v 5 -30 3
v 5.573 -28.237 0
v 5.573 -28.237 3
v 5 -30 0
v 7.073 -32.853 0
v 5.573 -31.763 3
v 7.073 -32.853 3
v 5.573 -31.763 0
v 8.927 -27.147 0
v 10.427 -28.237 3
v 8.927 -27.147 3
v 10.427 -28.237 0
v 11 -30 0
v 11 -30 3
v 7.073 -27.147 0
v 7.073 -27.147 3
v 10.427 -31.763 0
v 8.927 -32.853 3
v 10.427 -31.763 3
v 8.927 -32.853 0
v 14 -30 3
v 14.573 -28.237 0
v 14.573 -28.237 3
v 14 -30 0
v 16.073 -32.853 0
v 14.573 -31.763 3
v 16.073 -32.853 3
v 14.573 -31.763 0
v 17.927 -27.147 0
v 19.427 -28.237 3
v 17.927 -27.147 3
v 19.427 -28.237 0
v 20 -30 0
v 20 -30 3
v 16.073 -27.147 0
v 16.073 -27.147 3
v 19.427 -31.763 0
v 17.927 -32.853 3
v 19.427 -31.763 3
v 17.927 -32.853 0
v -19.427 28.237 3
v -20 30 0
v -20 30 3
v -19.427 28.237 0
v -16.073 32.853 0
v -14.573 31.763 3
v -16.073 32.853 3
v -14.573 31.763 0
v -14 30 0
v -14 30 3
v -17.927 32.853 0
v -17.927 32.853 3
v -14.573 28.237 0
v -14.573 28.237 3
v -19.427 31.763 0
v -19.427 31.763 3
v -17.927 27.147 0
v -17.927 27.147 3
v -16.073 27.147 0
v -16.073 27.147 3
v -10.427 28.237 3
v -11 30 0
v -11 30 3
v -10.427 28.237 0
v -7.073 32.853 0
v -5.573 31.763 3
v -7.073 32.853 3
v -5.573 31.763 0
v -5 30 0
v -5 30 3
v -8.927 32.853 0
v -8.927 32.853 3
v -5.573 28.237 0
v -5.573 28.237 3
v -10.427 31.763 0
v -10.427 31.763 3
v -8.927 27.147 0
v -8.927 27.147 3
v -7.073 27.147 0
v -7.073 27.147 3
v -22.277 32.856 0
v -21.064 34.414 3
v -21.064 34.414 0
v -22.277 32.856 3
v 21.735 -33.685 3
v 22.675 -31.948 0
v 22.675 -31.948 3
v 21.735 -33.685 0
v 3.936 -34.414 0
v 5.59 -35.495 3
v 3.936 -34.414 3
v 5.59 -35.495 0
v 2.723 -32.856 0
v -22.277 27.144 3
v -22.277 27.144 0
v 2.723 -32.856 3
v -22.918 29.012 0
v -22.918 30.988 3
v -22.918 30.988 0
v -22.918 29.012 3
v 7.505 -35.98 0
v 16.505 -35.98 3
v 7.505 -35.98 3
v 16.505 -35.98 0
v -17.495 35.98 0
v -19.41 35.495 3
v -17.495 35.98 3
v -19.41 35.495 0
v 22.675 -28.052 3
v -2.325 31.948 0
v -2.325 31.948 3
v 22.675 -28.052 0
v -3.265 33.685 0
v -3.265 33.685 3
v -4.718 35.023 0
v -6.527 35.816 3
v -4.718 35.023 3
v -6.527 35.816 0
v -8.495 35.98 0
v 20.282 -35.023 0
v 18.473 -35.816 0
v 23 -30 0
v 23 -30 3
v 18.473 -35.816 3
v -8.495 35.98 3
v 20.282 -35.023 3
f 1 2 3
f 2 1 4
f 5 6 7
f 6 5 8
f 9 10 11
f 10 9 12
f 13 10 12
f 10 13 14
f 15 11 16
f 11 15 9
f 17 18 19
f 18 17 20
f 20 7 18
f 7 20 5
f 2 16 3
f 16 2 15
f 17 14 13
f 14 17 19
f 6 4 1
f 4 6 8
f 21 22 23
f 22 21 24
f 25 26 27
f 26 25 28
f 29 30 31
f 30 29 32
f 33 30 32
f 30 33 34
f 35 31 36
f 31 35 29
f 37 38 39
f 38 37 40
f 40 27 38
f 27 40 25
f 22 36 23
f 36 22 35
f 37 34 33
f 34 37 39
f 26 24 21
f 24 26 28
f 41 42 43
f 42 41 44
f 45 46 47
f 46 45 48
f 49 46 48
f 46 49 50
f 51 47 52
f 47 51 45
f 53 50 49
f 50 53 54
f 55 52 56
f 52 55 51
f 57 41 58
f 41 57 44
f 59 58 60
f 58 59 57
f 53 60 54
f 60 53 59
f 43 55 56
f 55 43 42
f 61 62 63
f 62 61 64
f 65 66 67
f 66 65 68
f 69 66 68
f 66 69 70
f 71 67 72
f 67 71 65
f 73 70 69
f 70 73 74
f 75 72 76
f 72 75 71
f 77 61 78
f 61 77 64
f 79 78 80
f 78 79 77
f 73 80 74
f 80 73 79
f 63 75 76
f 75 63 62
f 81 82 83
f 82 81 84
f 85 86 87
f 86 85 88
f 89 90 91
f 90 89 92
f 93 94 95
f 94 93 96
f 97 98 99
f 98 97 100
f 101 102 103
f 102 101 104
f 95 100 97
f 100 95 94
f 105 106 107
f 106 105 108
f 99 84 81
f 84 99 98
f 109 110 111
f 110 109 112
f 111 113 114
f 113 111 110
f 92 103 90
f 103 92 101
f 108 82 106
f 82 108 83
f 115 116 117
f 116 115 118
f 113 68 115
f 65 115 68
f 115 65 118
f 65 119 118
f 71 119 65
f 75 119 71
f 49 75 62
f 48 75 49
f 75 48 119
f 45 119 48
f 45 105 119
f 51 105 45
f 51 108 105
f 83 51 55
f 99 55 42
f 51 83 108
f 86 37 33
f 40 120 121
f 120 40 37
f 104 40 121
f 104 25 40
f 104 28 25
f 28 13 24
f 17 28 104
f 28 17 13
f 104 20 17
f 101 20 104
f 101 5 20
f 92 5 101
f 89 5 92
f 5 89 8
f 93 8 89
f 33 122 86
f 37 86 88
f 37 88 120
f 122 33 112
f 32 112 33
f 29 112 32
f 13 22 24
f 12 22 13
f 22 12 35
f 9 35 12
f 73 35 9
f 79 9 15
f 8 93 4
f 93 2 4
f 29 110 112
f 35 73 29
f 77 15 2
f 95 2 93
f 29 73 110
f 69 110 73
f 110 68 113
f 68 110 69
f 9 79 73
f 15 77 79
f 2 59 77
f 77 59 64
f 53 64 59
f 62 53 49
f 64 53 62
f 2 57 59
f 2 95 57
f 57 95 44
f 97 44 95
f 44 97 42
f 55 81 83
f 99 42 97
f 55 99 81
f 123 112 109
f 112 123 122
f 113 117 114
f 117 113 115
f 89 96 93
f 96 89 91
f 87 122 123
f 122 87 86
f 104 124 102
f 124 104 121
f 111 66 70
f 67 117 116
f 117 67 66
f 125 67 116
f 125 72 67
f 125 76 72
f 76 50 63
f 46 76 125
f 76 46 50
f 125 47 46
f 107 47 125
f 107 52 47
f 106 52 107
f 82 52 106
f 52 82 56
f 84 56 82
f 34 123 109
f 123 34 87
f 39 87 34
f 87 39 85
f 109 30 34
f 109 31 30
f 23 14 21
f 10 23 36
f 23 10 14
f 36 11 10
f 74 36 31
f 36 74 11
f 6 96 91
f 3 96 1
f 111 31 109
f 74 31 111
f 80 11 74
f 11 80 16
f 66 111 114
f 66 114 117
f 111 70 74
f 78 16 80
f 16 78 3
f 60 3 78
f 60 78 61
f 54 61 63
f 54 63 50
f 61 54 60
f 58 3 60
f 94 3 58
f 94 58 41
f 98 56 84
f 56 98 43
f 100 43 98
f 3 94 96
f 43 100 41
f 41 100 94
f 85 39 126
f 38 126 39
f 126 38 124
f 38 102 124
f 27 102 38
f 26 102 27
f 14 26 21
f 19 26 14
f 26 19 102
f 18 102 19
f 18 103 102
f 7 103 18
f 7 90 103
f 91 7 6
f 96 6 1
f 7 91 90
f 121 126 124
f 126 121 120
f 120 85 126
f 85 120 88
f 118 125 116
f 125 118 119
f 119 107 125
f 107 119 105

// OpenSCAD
//#import("stls/arm.stl");

/**
 * Arm
 * rameno napriklad na RC auticko
 * @param h vyska ramena
 * @param offset vyosetni horni a spodni casti
 * @param thick tloustka ramena
 * @param number_holes pocet der nahore a dole
 * @param hole_radius polomer der v ramenu
 * mezera mezi diramy je jejich radius, to stejne od kraje
 * vyska je brana ze stredu der ke stredu der
 * off set je pocita opet ze stredu der
 * @author Jakub Průša
 */
module arm(
            height       = 60,
            offset       = -25,
            thick        = 3,
            number_holes = 2,
            hole_radius  = 3
) {
    difference() {
        hull() {
            for ( i=[-1,1], j=[-1,1] ) {
                    translate([ i*offset/2 + j*(1.5*hole_radius), i*height/2, 0 ])
                        cylinder( r=2*hole_radius, h=thick  );
            }
        }

        #translate([0,0,-thick/2])
            for ( i=[-1,1], j=[-1,1] ) {
                translate([ i*offset/2 + j*(1.5*hole_radius), i*height/2, 0 ])
                    cylinder( r=hole_radius, h=2*thick );
            }
    }
}

arm();
